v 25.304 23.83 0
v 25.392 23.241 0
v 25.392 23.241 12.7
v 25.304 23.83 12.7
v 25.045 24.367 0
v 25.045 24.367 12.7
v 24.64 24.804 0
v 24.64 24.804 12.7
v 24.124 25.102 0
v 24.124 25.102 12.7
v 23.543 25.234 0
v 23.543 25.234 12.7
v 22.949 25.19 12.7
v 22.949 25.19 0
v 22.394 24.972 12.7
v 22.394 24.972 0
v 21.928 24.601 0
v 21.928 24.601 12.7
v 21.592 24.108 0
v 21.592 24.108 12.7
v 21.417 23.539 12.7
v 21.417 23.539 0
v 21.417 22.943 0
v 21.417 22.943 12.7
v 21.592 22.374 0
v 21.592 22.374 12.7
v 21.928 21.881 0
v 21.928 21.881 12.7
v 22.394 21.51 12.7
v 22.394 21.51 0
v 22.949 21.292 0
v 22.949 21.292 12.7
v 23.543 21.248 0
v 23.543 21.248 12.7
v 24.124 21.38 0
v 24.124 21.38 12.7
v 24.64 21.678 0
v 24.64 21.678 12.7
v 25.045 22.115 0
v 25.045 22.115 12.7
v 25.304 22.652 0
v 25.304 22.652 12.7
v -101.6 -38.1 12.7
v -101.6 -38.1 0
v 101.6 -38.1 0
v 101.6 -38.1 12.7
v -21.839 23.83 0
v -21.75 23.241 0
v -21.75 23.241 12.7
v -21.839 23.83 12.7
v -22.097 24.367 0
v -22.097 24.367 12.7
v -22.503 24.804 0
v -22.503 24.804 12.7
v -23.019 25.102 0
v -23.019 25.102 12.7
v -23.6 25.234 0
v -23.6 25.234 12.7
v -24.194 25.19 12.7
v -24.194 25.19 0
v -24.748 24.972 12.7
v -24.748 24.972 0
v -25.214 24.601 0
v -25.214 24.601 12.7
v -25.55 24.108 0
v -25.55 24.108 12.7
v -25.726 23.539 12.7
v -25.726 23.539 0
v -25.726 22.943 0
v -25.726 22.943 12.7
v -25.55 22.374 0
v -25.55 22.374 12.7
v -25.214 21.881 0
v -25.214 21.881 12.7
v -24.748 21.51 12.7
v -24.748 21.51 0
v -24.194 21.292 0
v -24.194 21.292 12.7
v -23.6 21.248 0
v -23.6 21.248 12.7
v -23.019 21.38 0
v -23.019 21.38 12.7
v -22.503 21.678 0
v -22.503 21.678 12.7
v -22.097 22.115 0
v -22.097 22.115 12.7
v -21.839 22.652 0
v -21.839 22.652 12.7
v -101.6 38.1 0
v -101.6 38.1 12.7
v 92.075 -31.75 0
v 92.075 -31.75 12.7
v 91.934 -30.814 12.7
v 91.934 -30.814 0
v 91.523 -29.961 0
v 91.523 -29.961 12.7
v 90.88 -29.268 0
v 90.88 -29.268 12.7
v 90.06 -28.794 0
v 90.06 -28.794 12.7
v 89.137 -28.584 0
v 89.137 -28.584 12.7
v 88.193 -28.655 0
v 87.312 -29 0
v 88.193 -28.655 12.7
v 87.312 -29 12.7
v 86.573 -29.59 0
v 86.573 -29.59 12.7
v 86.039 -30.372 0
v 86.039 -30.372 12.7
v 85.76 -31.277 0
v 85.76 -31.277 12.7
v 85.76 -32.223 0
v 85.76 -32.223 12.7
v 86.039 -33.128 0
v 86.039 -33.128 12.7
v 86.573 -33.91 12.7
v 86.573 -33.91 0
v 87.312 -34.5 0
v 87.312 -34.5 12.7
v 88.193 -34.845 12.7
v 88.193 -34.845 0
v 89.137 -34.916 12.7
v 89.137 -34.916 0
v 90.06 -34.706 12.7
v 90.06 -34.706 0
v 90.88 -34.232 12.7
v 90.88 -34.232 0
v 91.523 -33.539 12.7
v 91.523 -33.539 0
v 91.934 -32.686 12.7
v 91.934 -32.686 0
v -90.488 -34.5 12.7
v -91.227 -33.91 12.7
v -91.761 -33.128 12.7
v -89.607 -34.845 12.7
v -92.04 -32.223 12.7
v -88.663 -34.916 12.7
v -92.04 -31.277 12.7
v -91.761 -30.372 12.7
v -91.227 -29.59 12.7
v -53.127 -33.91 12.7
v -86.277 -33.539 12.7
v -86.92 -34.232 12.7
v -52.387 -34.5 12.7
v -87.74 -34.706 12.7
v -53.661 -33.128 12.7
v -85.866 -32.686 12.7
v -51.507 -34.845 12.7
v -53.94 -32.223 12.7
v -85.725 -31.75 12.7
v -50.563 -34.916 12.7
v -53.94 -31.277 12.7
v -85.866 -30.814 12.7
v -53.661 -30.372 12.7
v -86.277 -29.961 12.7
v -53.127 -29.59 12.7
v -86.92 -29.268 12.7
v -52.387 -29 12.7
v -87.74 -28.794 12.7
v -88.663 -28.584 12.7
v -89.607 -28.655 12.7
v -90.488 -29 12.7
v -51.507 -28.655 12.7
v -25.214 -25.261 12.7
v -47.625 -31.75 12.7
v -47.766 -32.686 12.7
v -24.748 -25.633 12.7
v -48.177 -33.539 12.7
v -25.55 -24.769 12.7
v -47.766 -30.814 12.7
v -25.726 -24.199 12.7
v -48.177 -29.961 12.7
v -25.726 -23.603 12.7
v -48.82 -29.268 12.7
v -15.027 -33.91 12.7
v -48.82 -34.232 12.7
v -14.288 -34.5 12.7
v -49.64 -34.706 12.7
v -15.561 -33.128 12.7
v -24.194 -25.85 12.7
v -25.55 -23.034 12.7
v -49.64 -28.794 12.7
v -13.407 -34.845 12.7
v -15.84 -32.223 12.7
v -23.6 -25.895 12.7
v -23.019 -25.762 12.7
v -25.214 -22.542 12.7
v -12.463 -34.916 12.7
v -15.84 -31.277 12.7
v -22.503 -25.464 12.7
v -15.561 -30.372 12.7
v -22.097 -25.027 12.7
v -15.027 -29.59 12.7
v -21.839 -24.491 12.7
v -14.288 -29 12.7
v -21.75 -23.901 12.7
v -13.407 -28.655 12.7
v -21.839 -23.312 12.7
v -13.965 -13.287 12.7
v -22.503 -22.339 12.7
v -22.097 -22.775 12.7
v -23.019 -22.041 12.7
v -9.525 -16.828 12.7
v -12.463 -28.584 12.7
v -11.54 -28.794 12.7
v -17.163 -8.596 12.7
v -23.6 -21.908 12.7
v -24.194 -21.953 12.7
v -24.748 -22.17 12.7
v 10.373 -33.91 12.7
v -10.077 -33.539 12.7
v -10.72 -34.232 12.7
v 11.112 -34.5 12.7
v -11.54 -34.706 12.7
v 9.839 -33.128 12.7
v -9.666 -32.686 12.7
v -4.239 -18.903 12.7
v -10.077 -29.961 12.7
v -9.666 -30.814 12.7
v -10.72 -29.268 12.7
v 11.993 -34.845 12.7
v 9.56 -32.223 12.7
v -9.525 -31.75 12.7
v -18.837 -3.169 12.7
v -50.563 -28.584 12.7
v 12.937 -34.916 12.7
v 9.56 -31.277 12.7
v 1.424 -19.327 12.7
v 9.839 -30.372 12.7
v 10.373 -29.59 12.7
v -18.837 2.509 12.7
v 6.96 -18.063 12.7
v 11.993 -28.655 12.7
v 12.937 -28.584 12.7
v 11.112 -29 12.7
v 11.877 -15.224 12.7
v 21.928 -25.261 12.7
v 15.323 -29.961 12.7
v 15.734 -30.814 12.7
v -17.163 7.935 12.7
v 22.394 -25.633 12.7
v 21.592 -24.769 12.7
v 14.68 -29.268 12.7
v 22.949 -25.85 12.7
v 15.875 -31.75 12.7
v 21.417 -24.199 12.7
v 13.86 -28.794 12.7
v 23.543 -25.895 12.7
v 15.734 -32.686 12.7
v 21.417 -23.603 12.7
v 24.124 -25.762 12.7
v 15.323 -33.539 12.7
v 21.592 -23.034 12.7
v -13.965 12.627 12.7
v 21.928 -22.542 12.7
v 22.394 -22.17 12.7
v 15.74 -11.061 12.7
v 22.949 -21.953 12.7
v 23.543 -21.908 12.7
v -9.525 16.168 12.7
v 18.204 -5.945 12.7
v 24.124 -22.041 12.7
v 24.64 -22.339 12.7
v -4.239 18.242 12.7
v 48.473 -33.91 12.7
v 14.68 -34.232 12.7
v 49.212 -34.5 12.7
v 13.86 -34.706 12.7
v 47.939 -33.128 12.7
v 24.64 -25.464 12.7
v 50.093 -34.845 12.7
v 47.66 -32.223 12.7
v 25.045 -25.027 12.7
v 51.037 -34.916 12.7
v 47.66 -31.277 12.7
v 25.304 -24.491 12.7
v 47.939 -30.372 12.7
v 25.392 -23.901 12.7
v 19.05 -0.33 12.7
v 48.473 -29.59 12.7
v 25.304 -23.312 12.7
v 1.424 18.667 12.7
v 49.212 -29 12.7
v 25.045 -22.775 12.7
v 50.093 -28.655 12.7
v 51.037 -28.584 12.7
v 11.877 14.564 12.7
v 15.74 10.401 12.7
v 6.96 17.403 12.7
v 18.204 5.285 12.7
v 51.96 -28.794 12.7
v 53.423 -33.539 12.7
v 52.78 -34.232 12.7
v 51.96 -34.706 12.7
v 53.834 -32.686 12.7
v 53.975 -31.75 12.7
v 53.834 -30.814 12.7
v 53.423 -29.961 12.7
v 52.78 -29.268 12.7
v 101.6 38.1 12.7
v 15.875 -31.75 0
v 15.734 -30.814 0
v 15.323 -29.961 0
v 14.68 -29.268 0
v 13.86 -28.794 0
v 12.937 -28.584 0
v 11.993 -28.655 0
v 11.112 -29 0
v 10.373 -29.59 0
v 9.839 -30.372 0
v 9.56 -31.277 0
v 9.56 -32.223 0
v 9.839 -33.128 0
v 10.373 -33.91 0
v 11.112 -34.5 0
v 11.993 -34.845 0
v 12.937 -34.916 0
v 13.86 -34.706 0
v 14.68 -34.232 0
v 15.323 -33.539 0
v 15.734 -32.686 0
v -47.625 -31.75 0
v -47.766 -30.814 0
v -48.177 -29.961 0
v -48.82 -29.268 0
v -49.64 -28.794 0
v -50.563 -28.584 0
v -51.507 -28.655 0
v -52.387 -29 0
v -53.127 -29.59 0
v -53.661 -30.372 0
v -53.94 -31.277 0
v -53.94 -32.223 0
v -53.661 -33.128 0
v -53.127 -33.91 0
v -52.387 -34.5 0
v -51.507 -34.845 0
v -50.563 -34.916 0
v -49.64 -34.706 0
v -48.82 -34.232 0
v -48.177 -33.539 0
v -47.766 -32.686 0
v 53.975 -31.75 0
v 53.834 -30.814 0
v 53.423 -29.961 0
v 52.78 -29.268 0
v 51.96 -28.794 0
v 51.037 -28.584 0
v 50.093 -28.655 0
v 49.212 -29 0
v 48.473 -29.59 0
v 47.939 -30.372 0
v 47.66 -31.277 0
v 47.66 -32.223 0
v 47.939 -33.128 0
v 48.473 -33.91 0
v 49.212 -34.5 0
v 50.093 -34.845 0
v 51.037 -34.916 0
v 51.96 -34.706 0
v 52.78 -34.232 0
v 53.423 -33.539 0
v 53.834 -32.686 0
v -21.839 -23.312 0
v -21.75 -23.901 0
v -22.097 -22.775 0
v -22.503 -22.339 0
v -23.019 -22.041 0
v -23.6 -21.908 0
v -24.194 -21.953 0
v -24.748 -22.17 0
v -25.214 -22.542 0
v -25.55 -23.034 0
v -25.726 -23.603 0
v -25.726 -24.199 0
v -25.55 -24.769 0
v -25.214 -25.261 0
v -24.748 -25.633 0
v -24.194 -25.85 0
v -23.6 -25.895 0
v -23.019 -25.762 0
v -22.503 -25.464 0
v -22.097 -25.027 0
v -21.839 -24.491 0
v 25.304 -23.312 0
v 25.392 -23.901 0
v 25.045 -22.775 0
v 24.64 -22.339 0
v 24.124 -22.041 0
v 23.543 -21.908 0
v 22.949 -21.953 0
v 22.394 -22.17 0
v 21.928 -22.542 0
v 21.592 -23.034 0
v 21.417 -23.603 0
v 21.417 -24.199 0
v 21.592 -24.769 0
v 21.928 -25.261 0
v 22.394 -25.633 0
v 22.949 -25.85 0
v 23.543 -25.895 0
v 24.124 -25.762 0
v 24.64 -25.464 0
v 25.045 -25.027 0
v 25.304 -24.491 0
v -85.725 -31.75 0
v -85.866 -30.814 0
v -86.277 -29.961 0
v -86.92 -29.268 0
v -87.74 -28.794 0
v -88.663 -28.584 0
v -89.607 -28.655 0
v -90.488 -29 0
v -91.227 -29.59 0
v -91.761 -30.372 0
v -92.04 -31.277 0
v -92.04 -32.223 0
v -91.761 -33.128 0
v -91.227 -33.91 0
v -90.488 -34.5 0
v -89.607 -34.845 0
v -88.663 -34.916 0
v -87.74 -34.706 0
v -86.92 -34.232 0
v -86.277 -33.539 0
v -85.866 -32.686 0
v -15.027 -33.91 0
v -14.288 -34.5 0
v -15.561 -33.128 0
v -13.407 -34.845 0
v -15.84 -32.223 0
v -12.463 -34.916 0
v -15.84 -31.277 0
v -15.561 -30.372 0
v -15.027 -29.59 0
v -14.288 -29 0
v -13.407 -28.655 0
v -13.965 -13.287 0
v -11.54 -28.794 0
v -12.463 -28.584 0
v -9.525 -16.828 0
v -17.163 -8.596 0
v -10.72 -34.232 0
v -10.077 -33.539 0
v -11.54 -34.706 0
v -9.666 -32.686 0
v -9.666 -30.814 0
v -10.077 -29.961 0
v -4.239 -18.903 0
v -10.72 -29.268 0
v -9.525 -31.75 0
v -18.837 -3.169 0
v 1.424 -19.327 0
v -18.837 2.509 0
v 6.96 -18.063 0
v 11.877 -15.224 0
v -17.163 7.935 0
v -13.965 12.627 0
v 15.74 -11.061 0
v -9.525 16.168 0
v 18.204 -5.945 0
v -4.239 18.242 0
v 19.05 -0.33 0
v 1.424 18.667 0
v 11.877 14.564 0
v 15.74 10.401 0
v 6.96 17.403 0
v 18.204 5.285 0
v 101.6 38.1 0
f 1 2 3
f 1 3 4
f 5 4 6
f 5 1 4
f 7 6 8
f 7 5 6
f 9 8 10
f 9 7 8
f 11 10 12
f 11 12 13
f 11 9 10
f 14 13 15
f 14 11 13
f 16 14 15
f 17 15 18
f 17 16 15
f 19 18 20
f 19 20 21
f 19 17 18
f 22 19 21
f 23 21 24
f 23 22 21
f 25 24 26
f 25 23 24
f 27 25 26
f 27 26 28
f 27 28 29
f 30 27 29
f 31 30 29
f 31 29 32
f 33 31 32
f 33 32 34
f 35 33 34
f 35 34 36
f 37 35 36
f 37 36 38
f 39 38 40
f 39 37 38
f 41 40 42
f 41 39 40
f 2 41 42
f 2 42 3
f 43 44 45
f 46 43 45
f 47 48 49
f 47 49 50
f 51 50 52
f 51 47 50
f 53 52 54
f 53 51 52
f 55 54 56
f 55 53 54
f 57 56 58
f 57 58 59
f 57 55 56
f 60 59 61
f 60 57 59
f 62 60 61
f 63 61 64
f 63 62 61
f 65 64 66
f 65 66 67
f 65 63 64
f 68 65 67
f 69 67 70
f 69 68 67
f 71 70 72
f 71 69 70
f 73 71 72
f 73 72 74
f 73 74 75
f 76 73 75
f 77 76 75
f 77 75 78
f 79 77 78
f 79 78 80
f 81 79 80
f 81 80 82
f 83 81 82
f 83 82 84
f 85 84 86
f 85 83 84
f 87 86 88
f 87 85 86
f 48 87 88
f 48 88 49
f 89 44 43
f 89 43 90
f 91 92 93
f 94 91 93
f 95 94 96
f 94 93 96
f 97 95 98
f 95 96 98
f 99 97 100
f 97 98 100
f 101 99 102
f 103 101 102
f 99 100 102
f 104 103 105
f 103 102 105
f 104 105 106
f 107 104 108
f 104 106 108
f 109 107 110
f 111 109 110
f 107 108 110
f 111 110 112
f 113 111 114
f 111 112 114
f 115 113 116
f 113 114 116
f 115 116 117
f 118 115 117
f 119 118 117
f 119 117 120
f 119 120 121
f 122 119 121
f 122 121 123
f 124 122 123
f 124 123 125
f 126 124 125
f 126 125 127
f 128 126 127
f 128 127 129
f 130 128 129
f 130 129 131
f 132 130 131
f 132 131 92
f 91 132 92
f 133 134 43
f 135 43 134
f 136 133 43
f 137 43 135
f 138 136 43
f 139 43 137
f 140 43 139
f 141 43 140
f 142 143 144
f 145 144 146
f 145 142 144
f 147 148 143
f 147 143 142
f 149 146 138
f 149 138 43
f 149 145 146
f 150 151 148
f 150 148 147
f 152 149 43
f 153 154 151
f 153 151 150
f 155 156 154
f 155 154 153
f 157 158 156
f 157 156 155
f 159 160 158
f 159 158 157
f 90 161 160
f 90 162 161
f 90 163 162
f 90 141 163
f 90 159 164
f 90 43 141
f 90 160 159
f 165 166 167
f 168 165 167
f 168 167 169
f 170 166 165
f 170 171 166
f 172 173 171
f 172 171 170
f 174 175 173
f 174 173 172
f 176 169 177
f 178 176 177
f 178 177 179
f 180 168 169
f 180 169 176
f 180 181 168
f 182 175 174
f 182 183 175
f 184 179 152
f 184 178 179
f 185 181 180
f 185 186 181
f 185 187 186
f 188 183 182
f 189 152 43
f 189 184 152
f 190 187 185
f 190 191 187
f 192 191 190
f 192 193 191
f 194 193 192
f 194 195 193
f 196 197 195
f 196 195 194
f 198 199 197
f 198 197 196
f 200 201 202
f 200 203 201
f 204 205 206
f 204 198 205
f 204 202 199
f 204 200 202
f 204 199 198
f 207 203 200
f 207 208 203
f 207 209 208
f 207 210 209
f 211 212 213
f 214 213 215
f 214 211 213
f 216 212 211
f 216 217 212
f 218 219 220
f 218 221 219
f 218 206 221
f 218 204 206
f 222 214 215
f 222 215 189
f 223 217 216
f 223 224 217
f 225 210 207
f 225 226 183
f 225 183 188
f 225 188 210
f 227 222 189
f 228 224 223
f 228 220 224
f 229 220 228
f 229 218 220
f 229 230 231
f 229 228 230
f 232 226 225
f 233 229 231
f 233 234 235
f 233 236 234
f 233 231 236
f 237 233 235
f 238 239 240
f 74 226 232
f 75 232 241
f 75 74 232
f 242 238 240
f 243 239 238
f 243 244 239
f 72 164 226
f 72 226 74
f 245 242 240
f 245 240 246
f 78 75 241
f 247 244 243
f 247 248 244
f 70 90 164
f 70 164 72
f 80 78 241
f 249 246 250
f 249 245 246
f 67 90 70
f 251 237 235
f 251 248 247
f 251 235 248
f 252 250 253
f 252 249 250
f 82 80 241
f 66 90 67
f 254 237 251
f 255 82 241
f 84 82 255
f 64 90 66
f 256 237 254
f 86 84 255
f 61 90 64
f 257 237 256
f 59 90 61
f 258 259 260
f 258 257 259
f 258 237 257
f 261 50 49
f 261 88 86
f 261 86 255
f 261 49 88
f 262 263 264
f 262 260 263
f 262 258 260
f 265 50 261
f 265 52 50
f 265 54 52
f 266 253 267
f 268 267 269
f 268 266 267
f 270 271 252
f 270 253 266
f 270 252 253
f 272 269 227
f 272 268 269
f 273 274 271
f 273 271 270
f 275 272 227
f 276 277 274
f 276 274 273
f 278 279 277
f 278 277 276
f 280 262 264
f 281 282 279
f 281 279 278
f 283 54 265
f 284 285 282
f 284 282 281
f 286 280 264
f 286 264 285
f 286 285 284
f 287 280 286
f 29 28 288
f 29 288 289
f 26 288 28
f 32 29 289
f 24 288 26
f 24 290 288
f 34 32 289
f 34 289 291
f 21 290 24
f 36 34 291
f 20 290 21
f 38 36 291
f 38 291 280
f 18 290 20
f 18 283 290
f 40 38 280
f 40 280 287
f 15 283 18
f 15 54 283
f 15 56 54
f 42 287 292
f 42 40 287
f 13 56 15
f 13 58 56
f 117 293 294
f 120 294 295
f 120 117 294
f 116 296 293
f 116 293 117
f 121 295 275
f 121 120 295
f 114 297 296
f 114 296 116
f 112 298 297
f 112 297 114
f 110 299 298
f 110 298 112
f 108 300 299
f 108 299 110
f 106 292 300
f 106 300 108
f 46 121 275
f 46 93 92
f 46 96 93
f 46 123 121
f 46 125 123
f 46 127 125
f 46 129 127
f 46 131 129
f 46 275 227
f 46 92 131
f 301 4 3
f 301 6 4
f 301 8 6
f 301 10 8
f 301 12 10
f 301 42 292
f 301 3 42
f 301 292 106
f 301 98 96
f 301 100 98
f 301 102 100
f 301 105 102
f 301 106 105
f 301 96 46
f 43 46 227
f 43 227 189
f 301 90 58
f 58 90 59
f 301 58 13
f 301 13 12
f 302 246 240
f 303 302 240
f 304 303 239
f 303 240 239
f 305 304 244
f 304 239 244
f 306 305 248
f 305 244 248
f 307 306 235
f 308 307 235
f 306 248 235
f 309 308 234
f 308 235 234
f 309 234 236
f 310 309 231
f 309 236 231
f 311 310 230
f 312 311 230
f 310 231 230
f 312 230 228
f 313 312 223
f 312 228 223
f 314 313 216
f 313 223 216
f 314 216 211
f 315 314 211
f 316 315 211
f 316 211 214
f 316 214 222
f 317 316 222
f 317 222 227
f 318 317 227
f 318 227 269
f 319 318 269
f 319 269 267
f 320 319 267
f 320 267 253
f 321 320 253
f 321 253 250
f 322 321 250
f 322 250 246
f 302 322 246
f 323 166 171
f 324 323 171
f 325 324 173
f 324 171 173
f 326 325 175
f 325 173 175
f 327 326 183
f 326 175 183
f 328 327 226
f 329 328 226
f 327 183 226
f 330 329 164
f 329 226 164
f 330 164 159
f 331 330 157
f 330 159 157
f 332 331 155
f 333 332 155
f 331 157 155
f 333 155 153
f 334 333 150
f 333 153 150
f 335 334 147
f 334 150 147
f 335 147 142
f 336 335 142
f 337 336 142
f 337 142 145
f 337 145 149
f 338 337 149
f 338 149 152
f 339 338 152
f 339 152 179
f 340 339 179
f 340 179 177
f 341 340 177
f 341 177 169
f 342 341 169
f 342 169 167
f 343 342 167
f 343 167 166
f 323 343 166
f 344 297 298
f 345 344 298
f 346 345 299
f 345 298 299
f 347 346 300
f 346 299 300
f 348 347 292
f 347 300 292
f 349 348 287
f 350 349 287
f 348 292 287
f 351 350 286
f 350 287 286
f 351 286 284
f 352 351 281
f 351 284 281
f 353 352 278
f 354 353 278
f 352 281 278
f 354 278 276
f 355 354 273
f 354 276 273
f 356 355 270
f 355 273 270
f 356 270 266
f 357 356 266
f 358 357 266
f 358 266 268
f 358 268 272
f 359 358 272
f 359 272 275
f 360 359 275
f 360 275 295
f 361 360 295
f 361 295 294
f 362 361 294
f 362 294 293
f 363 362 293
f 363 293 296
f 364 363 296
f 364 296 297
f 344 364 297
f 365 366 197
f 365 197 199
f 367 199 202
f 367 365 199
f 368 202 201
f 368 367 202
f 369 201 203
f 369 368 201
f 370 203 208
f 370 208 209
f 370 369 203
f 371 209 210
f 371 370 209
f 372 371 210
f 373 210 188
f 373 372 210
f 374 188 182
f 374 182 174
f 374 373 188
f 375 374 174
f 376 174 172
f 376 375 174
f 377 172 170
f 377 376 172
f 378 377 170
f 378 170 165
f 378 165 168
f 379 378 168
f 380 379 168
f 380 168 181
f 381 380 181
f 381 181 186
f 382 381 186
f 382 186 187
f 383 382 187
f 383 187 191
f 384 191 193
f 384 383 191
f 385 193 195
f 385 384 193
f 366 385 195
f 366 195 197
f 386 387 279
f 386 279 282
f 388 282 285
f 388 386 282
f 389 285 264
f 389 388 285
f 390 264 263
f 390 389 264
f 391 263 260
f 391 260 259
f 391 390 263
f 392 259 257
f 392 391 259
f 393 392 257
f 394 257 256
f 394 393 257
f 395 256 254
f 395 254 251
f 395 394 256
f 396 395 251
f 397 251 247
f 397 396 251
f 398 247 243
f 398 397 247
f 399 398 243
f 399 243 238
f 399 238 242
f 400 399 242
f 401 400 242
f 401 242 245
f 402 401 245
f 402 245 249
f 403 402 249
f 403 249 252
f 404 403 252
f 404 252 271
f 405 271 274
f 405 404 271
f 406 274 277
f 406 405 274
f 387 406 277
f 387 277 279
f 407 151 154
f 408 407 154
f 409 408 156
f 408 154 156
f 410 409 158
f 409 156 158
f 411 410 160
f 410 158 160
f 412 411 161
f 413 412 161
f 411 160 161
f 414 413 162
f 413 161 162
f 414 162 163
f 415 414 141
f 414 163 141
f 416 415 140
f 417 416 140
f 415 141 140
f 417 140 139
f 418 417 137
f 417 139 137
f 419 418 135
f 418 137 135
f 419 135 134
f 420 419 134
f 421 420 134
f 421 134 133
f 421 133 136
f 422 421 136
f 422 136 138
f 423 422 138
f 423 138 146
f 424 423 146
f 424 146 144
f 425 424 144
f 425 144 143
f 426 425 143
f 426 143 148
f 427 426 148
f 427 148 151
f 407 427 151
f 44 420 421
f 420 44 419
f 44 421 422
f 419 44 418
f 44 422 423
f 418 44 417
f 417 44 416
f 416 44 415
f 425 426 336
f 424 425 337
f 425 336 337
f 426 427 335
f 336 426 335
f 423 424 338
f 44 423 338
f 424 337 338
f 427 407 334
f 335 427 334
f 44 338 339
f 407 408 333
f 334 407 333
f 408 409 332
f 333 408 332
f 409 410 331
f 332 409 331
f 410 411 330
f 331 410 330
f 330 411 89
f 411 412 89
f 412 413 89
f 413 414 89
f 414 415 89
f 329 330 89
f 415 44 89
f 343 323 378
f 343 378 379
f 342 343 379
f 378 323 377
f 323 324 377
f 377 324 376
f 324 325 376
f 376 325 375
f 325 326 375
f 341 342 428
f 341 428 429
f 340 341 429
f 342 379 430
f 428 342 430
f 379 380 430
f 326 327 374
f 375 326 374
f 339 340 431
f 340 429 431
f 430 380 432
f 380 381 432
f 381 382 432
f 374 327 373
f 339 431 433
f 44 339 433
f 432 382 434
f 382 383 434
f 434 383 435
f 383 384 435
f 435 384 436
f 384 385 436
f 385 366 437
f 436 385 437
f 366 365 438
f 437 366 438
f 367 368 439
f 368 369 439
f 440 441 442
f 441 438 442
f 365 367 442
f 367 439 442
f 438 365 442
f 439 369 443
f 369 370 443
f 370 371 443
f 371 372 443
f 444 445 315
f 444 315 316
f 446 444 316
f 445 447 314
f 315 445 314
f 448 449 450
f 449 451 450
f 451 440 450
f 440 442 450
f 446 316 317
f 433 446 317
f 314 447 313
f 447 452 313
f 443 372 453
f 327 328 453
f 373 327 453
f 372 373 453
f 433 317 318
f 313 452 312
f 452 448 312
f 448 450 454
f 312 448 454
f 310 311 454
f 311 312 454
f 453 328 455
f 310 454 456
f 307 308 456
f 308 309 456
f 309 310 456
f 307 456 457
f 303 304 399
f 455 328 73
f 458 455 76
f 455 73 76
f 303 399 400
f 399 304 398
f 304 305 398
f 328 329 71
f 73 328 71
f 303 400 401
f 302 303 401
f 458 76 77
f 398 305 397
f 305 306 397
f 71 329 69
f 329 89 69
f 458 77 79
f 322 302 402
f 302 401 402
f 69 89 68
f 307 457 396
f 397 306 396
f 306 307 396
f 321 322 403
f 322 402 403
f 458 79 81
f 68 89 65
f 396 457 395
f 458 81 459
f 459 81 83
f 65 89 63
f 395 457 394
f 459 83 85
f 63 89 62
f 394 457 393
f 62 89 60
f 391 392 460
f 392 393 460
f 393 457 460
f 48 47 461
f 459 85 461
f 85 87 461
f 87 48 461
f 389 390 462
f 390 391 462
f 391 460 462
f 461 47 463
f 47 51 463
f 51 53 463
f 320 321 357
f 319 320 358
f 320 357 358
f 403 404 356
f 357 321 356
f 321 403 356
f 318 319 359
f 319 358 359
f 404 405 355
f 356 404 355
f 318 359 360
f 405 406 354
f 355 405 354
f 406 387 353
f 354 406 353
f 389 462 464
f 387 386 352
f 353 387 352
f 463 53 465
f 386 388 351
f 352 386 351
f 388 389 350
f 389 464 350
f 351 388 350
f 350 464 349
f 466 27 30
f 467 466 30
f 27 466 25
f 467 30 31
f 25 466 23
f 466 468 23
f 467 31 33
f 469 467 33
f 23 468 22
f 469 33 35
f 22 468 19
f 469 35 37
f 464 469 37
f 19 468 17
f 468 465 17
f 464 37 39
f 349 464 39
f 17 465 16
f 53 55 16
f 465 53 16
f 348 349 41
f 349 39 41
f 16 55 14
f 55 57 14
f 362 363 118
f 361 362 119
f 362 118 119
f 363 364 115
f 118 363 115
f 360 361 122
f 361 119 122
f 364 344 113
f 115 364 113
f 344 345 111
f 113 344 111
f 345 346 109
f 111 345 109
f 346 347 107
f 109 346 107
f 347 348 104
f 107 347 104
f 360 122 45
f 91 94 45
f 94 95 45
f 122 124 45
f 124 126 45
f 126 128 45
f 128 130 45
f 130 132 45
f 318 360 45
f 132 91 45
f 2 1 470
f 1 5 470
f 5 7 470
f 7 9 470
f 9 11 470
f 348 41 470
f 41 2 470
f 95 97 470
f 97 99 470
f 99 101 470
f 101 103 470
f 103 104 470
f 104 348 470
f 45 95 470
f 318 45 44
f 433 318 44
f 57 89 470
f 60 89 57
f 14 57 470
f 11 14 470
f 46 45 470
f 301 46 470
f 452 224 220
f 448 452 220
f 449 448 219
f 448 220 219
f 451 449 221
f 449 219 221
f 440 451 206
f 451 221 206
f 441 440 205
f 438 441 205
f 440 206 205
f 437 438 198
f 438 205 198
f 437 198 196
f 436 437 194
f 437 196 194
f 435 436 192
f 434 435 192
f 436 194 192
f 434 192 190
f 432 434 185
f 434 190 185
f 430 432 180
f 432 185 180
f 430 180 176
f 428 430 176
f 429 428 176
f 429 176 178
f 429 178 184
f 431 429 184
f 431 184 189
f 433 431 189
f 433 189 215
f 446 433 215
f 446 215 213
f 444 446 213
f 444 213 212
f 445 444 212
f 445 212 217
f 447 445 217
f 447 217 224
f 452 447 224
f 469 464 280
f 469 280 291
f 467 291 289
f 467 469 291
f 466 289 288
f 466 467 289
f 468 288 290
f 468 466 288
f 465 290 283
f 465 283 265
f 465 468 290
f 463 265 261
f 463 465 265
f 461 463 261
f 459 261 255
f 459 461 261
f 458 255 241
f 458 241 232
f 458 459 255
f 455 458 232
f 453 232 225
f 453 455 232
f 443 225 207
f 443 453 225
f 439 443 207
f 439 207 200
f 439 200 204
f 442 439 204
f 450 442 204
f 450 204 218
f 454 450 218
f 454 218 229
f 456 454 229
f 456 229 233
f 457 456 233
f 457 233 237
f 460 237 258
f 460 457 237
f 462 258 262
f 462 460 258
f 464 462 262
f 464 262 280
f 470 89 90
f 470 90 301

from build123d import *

# Parameters (mm, degrees)
F0_W     = 203.2
F0_H     = 76.2
F0_R     = 1.99898
F0_R_2   = 19.05
F1_DEPTH = 12.7
F2_R     = 3.175
F3_DEPTH = 12.701


with BuildPart() as f1:
    # F0 (on Top) → F1 (new body)
    with BuildSketch(Plane.XY):
        Rectangle(F0_W, F0_H)
        with Locations((-23.749, -23.9014)):
            Circle(F0_R, mode=Mode.SUBTRACT)
        with Locations((0, -0.3302)):
            Circle(F0_R_2, mode=Mode.SUBTRACT)
        with Locations((23.3934, -23.9014)):
            Circle(F0_R, mode=Mode.SUBTRACT)
        with Locations((-23.749, 23.241)):
            Circle(F0_R, mode=Mode.SUBTRACT)
        with Locations((23.3934, 23.241)):
            Circle(F0_R, mode=Mode.SUBTRACT)
    extrude(amount=F1_DEPTH)

    # F2 (on face) → F3 (cut, through all)
    with BuildSketch(Plane.XY.offset(12.7)):
        with Locations((-88.9, -31.75)):
            Circle(F2_R)
        with Locations((-50.8, -31.75)):
            Circle(F2_R)
        with Locations((-12.7, -31.75)):
            Circle(F2_R)
        with Locations((12.7, -31.75)):
            Circle(F2_R)
        with Locations((50.8, -31.75)):
            Circle(F2_R)
        with Locations((88.9, -31.75)):
            Circle(F2_R)
    extrude(amount=-F3_DEPTH, mode=Mode.SUBTRACT)


solid = f1.part
